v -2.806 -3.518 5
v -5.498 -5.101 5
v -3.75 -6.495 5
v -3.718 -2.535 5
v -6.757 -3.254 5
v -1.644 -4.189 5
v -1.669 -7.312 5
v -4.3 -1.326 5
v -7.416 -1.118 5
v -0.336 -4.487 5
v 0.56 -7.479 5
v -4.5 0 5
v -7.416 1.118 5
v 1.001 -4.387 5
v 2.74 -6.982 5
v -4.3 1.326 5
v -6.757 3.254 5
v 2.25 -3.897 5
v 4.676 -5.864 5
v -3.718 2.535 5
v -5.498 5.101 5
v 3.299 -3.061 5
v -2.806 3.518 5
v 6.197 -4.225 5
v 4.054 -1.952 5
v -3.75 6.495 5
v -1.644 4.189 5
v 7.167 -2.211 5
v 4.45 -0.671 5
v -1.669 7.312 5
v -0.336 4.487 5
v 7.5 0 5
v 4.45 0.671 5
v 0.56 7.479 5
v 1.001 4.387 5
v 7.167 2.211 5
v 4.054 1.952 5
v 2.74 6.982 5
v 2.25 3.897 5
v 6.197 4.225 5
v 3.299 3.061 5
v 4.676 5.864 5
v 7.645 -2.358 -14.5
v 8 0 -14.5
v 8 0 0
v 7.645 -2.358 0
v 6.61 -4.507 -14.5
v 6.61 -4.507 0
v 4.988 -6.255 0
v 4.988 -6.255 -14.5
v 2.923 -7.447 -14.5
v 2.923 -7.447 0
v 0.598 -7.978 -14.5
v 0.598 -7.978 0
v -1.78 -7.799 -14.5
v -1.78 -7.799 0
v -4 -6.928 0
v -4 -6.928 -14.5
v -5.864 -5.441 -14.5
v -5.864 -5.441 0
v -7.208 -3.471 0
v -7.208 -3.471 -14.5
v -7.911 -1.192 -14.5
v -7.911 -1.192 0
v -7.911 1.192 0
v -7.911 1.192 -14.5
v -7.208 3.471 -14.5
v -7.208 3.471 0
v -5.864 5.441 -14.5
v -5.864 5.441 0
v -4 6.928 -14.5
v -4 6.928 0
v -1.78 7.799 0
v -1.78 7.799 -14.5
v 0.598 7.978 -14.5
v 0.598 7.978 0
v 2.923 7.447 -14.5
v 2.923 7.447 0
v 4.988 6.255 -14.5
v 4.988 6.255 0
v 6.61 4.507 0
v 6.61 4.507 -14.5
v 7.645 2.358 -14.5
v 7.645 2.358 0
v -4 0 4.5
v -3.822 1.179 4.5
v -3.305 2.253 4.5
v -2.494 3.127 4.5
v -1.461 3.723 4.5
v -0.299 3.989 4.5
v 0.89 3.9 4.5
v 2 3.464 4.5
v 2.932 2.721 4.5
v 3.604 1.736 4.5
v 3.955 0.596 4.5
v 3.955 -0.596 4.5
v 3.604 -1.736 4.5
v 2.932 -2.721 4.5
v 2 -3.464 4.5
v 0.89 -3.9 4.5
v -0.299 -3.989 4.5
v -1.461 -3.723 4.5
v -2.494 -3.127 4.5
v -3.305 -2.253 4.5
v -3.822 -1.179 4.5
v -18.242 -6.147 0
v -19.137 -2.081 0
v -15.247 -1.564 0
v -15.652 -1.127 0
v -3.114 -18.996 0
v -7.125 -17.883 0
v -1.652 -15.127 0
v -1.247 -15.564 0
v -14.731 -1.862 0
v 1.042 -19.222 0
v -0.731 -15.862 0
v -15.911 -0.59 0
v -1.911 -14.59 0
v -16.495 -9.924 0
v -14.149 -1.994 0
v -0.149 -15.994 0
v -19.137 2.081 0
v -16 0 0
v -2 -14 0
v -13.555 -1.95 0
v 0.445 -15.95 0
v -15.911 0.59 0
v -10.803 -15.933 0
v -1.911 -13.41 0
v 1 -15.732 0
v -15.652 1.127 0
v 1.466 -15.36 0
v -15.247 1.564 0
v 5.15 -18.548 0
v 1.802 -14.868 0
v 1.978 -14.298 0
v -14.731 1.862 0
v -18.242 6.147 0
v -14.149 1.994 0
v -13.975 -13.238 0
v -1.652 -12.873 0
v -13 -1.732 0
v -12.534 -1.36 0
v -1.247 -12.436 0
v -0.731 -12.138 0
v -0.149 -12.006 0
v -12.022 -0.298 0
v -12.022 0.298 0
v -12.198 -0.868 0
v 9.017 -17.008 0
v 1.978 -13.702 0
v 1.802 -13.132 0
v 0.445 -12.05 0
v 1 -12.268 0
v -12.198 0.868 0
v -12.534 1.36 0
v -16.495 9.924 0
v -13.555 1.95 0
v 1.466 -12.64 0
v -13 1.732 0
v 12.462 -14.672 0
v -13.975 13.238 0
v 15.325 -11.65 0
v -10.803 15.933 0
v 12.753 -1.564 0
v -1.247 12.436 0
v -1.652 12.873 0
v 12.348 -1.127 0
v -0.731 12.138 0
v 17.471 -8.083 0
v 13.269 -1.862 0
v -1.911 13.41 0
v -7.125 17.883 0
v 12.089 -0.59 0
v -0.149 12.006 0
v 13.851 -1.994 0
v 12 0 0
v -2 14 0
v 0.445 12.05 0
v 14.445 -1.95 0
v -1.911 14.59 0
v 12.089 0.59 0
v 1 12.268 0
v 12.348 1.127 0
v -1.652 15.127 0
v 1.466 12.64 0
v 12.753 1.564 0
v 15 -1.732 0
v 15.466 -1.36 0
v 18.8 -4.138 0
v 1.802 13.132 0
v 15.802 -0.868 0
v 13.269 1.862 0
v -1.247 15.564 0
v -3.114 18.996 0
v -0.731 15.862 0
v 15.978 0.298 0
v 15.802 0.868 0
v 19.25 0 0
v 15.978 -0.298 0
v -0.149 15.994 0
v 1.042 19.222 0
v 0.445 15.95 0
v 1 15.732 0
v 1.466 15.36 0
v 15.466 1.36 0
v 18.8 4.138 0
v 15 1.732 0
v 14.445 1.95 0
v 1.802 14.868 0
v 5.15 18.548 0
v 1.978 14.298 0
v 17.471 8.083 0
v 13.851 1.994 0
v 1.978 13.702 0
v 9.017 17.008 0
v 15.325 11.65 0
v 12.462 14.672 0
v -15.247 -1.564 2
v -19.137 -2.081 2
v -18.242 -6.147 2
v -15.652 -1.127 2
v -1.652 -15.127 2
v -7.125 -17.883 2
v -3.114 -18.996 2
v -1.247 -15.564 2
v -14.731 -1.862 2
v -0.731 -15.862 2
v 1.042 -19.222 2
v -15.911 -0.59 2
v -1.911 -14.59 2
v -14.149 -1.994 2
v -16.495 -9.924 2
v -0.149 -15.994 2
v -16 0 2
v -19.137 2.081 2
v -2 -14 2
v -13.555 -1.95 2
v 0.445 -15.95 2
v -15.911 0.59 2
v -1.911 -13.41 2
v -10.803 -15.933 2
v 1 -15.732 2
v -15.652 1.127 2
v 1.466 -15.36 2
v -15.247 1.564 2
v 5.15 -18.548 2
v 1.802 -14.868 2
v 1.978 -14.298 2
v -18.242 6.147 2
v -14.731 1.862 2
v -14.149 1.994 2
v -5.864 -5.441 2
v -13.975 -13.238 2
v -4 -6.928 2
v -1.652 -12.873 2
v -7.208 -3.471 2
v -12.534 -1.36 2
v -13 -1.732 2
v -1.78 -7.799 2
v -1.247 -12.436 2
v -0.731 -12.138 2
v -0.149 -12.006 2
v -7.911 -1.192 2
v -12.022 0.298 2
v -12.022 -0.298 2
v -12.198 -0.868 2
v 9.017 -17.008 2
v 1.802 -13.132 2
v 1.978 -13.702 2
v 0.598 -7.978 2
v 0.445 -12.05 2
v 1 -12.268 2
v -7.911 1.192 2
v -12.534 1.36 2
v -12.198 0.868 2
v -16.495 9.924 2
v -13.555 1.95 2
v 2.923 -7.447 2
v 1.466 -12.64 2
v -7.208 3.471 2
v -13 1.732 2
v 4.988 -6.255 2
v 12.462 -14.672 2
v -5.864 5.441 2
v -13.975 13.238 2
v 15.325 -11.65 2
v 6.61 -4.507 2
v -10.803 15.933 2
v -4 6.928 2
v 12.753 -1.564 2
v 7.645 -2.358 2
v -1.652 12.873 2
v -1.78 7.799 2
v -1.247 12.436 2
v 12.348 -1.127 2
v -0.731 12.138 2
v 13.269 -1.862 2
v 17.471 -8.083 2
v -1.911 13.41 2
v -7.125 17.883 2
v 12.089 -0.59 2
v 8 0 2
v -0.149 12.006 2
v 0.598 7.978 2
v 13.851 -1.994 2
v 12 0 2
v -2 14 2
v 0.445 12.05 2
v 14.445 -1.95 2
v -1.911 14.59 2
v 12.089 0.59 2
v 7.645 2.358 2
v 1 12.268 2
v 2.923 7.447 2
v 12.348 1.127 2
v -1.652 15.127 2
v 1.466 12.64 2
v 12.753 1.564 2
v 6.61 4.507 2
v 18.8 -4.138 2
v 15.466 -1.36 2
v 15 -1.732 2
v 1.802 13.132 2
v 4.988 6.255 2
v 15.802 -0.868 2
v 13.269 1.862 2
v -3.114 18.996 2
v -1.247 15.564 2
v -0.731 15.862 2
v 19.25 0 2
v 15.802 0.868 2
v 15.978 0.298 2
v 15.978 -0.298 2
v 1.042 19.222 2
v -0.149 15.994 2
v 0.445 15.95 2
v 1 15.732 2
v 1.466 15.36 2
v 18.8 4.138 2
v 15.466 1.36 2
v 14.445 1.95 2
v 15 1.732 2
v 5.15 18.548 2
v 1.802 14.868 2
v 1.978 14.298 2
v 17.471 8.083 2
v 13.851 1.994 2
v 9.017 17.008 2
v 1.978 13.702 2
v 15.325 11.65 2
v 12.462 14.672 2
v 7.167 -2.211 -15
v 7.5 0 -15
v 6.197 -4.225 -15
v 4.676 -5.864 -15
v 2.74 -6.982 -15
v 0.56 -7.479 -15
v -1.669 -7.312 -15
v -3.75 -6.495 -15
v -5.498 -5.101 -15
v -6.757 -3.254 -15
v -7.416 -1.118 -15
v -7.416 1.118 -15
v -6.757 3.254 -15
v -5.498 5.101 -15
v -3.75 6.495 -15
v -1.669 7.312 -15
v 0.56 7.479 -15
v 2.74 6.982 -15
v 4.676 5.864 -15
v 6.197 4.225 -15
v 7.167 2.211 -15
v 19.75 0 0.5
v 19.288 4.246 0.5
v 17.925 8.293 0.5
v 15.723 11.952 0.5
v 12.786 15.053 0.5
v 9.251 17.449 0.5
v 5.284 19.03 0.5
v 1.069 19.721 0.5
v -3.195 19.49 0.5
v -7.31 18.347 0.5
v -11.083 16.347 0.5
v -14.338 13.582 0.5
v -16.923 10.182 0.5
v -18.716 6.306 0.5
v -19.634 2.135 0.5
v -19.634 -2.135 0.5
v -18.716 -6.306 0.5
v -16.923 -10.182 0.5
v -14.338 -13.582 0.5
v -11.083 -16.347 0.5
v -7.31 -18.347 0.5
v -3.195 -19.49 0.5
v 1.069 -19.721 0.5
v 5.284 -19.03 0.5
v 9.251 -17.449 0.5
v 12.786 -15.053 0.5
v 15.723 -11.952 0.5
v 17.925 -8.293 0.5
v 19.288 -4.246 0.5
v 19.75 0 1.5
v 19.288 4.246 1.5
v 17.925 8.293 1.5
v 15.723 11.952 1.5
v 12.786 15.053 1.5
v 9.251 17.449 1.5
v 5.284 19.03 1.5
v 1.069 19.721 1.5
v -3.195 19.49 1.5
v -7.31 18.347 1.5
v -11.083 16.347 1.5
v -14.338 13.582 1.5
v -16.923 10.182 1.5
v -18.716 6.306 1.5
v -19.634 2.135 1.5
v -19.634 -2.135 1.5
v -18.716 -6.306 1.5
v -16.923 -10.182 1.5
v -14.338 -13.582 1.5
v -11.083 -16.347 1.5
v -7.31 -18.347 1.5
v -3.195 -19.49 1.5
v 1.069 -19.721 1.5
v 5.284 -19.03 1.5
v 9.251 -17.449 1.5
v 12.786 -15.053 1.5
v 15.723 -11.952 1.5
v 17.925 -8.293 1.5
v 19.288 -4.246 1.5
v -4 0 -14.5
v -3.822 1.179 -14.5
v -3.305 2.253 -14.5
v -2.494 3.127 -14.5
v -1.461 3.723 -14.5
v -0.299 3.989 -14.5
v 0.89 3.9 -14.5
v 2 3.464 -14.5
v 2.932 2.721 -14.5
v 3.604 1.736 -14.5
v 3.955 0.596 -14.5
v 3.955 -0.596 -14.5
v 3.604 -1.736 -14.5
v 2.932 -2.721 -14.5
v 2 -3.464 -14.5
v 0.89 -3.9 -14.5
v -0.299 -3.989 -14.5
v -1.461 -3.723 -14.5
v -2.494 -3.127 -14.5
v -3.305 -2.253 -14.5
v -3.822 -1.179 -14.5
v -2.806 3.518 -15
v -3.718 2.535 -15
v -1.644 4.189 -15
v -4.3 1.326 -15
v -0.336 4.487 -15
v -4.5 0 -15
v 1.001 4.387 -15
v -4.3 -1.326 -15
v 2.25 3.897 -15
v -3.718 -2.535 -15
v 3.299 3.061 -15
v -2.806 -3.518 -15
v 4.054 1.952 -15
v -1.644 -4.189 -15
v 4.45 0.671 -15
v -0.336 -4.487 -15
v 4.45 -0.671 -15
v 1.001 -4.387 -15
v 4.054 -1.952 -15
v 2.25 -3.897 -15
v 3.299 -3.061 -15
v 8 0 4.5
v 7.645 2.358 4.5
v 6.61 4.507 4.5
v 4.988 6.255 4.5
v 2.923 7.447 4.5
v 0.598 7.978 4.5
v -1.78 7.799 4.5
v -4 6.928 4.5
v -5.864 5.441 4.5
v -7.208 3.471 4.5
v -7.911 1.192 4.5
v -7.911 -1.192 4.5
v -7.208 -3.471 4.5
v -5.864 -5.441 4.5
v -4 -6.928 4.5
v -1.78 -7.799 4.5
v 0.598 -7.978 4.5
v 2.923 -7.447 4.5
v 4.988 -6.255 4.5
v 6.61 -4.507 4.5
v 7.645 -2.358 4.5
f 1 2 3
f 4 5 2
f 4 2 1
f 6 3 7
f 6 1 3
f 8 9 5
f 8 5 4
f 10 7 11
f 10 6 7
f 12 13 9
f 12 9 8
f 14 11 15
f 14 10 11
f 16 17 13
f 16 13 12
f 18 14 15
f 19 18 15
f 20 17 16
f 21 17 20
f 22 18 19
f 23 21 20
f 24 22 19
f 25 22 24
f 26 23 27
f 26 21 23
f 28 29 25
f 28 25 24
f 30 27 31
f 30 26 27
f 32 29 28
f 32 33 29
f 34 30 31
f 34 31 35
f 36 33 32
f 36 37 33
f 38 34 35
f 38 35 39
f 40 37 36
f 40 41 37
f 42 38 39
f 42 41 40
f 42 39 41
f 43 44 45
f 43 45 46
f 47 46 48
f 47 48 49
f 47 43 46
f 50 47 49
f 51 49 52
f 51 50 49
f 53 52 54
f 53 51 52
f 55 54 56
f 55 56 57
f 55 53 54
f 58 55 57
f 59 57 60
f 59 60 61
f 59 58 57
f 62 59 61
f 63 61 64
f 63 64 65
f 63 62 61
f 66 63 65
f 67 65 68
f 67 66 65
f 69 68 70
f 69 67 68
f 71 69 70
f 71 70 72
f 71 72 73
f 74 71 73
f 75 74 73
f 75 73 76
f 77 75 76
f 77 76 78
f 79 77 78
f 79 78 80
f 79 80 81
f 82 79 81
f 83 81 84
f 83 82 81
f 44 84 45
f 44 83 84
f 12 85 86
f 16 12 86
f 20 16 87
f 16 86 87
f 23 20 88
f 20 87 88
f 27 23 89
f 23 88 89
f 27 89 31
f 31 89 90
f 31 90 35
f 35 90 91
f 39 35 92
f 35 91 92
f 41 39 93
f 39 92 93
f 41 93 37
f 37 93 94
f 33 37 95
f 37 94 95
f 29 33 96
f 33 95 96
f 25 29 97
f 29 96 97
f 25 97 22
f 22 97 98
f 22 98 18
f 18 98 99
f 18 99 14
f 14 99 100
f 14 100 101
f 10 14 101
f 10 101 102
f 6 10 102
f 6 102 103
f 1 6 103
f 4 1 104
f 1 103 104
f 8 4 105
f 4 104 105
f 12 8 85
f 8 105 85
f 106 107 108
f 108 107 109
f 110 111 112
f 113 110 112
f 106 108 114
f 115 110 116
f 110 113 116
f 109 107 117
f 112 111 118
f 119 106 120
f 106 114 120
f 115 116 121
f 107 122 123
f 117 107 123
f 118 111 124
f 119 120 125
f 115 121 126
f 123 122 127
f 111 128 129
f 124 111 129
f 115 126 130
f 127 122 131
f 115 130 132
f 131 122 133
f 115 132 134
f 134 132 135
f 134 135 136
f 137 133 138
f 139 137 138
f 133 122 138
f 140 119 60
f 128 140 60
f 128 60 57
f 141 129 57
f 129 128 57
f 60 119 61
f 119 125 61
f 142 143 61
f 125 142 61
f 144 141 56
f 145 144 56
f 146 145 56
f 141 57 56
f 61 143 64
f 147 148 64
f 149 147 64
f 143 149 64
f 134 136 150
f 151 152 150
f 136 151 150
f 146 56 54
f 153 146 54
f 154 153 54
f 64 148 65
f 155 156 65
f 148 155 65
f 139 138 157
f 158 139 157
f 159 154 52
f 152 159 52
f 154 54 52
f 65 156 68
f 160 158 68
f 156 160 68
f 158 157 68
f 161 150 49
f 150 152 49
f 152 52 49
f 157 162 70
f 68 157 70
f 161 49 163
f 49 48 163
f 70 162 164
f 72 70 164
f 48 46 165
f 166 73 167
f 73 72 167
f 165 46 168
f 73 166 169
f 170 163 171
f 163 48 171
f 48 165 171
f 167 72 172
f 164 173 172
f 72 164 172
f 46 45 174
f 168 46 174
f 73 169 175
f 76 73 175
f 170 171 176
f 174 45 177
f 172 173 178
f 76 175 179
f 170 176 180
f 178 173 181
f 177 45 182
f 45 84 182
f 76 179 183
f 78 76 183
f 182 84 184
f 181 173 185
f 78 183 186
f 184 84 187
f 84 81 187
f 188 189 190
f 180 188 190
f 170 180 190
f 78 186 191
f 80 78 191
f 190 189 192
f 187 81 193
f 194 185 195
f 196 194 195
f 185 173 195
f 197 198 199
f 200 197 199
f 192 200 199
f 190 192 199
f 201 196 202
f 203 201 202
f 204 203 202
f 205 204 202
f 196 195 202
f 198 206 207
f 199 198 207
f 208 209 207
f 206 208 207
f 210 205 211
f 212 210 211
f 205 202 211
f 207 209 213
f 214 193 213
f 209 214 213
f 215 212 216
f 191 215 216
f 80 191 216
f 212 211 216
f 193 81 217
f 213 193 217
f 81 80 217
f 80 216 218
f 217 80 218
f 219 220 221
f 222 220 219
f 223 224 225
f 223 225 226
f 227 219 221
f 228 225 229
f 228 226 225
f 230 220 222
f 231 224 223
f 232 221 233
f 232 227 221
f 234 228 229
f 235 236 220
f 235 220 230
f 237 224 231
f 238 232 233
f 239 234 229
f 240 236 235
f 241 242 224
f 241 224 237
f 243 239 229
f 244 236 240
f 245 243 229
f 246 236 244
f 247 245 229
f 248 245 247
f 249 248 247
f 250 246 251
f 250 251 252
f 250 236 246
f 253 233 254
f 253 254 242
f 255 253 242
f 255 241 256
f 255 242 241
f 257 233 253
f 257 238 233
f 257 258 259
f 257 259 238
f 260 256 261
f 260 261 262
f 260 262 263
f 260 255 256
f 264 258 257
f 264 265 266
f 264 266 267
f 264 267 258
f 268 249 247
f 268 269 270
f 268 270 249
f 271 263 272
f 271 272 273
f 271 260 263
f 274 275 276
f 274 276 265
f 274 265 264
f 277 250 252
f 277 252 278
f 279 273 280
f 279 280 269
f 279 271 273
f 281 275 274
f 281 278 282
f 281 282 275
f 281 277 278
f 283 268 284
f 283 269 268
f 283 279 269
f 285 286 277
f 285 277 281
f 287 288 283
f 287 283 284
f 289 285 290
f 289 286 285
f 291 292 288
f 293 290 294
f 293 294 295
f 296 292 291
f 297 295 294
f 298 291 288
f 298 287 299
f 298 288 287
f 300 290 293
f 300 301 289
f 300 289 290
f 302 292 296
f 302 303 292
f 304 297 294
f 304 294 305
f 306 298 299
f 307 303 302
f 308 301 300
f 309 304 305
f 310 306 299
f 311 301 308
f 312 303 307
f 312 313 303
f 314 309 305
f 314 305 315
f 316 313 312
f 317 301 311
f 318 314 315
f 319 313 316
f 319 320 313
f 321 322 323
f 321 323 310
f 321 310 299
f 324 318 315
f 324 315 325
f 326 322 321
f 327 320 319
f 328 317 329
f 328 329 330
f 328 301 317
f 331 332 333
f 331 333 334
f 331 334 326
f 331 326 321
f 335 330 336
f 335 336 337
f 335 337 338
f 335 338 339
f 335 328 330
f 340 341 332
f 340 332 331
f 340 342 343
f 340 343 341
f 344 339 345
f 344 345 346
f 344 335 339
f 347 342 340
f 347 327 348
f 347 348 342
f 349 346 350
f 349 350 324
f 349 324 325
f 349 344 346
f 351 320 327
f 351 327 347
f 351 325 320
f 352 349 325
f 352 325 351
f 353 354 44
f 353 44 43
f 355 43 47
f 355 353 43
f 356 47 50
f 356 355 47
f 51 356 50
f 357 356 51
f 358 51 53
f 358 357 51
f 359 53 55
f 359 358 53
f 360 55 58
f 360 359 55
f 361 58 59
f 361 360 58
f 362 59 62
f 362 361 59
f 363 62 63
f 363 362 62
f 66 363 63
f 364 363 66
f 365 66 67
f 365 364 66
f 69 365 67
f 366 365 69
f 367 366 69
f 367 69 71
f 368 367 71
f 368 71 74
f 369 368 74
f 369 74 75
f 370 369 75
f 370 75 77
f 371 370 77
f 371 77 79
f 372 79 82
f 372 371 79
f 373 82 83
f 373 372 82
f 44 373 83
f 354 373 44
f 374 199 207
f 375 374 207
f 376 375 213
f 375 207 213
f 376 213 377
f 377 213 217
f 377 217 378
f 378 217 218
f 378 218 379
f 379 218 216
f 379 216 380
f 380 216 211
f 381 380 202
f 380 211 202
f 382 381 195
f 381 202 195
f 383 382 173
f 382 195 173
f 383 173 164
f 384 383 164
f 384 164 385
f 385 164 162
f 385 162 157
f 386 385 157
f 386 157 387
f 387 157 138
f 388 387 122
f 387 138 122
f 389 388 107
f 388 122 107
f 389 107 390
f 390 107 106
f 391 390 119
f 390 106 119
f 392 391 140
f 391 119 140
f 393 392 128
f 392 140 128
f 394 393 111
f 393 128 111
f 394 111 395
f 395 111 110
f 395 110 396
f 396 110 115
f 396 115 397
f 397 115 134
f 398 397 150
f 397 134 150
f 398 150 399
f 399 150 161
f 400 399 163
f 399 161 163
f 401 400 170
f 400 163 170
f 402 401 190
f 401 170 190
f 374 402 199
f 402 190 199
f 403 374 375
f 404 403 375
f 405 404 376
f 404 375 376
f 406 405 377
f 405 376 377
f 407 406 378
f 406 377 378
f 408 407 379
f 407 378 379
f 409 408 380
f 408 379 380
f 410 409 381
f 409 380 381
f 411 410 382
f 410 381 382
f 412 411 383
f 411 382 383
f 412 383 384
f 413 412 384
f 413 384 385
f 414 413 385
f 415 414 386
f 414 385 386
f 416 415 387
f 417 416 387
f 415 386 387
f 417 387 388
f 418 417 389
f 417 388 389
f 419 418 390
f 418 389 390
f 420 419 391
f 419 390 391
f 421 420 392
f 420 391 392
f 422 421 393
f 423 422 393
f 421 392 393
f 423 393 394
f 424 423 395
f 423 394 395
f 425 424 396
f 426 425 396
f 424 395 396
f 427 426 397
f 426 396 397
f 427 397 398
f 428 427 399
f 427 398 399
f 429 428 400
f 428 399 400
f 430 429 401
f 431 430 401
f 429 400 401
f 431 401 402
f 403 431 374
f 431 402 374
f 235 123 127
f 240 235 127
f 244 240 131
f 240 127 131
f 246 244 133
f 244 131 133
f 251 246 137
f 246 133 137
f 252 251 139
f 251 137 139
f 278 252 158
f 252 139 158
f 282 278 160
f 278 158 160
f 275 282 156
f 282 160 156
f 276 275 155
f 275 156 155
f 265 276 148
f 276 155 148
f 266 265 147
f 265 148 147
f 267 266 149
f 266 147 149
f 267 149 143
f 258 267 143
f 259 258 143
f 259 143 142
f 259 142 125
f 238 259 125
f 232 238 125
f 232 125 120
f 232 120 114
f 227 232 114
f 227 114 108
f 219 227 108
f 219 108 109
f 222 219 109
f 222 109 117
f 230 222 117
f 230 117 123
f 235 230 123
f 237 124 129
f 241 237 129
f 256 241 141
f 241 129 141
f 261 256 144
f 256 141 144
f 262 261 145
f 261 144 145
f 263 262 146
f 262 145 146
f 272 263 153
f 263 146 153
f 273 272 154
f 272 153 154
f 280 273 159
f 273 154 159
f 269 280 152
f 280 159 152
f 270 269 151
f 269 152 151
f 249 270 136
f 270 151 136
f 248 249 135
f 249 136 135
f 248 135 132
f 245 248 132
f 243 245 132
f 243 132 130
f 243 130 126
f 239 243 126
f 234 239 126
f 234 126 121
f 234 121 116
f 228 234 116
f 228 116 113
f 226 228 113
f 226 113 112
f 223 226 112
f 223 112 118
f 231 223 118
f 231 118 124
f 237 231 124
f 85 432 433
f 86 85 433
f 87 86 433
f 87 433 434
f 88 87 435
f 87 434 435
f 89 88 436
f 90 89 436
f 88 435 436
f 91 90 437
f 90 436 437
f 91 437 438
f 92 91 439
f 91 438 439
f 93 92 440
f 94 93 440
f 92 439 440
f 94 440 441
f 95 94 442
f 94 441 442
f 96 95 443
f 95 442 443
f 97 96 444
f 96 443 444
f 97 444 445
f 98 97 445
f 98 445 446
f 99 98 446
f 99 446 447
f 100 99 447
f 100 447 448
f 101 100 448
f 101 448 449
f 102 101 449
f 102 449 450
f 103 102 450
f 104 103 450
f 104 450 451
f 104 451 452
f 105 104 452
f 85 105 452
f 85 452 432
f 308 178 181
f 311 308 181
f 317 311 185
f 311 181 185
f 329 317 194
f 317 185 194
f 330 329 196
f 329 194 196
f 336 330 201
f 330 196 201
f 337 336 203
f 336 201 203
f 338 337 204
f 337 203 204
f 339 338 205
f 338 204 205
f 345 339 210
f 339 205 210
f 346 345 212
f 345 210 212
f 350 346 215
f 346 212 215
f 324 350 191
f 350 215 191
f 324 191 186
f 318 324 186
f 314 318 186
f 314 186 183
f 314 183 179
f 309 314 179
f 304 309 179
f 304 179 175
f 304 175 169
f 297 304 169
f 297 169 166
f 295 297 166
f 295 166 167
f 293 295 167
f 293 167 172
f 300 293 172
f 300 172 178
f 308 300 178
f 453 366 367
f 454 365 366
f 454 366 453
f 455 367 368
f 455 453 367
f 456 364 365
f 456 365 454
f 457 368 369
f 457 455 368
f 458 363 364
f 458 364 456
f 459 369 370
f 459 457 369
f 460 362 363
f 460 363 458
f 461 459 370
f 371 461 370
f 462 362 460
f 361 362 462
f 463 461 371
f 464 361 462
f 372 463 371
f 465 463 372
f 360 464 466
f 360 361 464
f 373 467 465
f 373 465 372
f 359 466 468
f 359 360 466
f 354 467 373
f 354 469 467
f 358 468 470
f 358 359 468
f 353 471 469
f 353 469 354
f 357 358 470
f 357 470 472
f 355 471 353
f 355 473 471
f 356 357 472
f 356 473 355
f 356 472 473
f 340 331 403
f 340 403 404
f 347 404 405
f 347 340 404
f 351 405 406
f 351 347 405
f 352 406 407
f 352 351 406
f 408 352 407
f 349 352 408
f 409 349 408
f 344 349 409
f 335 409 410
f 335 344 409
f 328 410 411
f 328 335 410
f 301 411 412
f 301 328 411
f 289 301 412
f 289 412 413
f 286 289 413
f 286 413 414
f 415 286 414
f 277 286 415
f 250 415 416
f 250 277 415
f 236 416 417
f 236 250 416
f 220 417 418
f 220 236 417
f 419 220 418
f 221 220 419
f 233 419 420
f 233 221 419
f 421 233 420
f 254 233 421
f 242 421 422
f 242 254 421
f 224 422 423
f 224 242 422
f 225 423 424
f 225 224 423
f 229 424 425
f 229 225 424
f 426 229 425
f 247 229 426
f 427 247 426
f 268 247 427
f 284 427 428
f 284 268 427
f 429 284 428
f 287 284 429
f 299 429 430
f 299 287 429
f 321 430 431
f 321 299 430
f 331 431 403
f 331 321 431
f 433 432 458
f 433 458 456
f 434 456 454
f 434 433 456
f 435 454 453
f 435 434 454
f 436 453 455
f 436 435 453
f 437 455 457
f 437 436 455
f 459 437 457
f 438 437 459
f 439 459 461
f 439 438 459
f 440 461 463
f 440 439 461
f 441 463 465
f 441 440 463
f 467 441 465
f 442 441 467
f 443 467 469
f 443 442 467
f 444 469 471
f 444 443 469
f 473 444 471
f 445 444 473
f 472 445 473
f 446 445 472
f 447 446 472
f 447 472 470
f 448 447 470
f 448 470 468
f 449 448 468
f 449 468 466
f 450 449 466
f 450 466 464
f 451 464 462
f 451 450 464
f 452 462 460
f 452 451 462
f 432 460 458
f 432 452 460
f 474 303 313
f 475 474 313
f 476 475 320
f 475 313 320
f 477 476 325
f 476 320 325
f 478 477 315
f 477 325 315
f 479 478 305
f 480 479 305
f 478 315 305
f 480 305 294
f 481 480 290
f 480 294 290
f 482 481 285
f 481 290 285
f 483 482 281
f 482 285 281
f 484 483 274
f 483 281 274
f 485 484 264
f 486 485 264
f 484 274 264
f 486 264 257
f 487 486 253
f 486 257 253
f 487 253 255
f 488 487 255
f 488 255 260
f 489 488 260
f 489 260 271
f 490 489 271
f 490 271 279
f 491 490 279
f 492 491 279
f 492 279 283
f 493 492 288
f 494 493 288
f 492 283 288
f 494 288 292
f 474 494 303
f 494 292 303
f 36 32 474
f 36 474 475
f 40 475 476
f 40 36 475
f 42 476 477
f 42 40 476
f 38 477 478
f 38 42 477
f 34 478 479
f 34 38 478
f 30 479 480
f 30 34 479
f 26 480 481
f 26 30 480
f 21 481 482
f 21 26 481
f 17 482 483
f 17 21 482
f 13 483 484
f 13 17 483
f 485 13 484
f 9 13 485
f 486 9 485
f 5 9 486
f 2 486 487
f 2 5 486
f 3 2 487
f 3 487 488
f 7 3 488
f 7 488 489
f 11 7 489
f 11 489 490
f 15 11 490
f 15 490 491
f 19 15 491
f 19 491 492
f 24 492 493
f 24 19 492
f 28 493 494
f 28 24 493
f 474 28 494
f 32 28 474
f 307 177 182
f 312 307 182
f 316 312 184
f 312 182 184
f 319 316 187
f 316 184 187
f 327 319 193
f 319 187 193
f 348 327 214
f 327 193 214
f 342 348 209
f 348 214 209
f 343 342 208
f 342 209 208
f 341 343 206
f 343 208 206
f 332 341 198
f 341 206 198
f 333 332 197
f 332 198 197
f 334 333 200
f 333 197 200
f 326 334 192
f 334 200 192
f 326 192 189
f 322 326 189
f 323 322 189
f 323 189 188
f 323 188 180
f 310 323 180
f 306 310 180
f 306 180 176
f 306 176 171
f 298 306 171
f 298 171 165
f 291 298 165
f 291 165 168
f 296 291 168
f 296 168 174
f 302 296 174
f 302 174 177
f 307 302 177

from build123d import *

# Parameters (mm, degrees)
SKETCH_1_R         = 19.75
EXTRUDE_1_DEPTH    = 2
SKETCH_2_R         = 8
EXTRUDE_2_DEPTH    = 3
EXTRUDE_START      = 15
SKETCH_3_R         = 8
EXTRUDE_3_DEPTH    = 15
HOLE_WIZARD_M8_1_D = 8
HOLE_WIZARD_M4_1_D = 4
CHAMFER_1_SIZE     = 0.5


with BuildPart() as part:
    # 草图1 → 凸台-拉伸1 (new body)
    with BuildSketch(Plane.XY):
        Circle(SKETCH_1_R)
    extrude(amount=EXTRUDE_1_DEPTH)

    # 草图2 → 凸台-拉伸2 (add)
    with BuildSketch(Plane.XY.offset(2)):
        Circle(SKETCH_2_R)
    extrude(amount=EXTRUDE_2_DEPTH)

    # 草图3 → 凸台-拉伸3 (add)
    with BuildSketch(Plane(origin=(0, 0, 0), x_dir=(-1, 0, 0), z_dir=(0, 0, -1)).offset(EXTRUDE_START)):
        with Locations(Location((0, 0, 0), (0, 0, 180))):
            Circle(SKETCH_3_R)
    extrude(amount=-EXTRUDE_3_DEPTH)

    # M8 螺纹孔1 (through all)
    with Locations(Plane.XY.offset(5)):
        with Locations((0, 0)):
            Hole(HOLE_WIZARD_M8_1_D / 2)

    # M4 螺纹孔1 (through all)
    with Locations(Plane.XY.offset(2)):
        with Locations((0, 14), (0, -14), (-14, 0), (14, 0)):
            Hole(HOLE_WIZARD_M4_1_D / 2)

    # 倒角1
    chamfer_1_edges = [part.edges().sort_by_distance(p)[0] for p in [
        (-8, 0, -15),
        (4, 0, 5),
        (4, 0, -15),
        (-19.75, 0, 0),
        (-19.75, 0, 2),
        (-8, 0, 5),
    ]]
    chamfer(chamfer_1_edges, length=CHAMFER_1_SIZE)


solid = part.part
